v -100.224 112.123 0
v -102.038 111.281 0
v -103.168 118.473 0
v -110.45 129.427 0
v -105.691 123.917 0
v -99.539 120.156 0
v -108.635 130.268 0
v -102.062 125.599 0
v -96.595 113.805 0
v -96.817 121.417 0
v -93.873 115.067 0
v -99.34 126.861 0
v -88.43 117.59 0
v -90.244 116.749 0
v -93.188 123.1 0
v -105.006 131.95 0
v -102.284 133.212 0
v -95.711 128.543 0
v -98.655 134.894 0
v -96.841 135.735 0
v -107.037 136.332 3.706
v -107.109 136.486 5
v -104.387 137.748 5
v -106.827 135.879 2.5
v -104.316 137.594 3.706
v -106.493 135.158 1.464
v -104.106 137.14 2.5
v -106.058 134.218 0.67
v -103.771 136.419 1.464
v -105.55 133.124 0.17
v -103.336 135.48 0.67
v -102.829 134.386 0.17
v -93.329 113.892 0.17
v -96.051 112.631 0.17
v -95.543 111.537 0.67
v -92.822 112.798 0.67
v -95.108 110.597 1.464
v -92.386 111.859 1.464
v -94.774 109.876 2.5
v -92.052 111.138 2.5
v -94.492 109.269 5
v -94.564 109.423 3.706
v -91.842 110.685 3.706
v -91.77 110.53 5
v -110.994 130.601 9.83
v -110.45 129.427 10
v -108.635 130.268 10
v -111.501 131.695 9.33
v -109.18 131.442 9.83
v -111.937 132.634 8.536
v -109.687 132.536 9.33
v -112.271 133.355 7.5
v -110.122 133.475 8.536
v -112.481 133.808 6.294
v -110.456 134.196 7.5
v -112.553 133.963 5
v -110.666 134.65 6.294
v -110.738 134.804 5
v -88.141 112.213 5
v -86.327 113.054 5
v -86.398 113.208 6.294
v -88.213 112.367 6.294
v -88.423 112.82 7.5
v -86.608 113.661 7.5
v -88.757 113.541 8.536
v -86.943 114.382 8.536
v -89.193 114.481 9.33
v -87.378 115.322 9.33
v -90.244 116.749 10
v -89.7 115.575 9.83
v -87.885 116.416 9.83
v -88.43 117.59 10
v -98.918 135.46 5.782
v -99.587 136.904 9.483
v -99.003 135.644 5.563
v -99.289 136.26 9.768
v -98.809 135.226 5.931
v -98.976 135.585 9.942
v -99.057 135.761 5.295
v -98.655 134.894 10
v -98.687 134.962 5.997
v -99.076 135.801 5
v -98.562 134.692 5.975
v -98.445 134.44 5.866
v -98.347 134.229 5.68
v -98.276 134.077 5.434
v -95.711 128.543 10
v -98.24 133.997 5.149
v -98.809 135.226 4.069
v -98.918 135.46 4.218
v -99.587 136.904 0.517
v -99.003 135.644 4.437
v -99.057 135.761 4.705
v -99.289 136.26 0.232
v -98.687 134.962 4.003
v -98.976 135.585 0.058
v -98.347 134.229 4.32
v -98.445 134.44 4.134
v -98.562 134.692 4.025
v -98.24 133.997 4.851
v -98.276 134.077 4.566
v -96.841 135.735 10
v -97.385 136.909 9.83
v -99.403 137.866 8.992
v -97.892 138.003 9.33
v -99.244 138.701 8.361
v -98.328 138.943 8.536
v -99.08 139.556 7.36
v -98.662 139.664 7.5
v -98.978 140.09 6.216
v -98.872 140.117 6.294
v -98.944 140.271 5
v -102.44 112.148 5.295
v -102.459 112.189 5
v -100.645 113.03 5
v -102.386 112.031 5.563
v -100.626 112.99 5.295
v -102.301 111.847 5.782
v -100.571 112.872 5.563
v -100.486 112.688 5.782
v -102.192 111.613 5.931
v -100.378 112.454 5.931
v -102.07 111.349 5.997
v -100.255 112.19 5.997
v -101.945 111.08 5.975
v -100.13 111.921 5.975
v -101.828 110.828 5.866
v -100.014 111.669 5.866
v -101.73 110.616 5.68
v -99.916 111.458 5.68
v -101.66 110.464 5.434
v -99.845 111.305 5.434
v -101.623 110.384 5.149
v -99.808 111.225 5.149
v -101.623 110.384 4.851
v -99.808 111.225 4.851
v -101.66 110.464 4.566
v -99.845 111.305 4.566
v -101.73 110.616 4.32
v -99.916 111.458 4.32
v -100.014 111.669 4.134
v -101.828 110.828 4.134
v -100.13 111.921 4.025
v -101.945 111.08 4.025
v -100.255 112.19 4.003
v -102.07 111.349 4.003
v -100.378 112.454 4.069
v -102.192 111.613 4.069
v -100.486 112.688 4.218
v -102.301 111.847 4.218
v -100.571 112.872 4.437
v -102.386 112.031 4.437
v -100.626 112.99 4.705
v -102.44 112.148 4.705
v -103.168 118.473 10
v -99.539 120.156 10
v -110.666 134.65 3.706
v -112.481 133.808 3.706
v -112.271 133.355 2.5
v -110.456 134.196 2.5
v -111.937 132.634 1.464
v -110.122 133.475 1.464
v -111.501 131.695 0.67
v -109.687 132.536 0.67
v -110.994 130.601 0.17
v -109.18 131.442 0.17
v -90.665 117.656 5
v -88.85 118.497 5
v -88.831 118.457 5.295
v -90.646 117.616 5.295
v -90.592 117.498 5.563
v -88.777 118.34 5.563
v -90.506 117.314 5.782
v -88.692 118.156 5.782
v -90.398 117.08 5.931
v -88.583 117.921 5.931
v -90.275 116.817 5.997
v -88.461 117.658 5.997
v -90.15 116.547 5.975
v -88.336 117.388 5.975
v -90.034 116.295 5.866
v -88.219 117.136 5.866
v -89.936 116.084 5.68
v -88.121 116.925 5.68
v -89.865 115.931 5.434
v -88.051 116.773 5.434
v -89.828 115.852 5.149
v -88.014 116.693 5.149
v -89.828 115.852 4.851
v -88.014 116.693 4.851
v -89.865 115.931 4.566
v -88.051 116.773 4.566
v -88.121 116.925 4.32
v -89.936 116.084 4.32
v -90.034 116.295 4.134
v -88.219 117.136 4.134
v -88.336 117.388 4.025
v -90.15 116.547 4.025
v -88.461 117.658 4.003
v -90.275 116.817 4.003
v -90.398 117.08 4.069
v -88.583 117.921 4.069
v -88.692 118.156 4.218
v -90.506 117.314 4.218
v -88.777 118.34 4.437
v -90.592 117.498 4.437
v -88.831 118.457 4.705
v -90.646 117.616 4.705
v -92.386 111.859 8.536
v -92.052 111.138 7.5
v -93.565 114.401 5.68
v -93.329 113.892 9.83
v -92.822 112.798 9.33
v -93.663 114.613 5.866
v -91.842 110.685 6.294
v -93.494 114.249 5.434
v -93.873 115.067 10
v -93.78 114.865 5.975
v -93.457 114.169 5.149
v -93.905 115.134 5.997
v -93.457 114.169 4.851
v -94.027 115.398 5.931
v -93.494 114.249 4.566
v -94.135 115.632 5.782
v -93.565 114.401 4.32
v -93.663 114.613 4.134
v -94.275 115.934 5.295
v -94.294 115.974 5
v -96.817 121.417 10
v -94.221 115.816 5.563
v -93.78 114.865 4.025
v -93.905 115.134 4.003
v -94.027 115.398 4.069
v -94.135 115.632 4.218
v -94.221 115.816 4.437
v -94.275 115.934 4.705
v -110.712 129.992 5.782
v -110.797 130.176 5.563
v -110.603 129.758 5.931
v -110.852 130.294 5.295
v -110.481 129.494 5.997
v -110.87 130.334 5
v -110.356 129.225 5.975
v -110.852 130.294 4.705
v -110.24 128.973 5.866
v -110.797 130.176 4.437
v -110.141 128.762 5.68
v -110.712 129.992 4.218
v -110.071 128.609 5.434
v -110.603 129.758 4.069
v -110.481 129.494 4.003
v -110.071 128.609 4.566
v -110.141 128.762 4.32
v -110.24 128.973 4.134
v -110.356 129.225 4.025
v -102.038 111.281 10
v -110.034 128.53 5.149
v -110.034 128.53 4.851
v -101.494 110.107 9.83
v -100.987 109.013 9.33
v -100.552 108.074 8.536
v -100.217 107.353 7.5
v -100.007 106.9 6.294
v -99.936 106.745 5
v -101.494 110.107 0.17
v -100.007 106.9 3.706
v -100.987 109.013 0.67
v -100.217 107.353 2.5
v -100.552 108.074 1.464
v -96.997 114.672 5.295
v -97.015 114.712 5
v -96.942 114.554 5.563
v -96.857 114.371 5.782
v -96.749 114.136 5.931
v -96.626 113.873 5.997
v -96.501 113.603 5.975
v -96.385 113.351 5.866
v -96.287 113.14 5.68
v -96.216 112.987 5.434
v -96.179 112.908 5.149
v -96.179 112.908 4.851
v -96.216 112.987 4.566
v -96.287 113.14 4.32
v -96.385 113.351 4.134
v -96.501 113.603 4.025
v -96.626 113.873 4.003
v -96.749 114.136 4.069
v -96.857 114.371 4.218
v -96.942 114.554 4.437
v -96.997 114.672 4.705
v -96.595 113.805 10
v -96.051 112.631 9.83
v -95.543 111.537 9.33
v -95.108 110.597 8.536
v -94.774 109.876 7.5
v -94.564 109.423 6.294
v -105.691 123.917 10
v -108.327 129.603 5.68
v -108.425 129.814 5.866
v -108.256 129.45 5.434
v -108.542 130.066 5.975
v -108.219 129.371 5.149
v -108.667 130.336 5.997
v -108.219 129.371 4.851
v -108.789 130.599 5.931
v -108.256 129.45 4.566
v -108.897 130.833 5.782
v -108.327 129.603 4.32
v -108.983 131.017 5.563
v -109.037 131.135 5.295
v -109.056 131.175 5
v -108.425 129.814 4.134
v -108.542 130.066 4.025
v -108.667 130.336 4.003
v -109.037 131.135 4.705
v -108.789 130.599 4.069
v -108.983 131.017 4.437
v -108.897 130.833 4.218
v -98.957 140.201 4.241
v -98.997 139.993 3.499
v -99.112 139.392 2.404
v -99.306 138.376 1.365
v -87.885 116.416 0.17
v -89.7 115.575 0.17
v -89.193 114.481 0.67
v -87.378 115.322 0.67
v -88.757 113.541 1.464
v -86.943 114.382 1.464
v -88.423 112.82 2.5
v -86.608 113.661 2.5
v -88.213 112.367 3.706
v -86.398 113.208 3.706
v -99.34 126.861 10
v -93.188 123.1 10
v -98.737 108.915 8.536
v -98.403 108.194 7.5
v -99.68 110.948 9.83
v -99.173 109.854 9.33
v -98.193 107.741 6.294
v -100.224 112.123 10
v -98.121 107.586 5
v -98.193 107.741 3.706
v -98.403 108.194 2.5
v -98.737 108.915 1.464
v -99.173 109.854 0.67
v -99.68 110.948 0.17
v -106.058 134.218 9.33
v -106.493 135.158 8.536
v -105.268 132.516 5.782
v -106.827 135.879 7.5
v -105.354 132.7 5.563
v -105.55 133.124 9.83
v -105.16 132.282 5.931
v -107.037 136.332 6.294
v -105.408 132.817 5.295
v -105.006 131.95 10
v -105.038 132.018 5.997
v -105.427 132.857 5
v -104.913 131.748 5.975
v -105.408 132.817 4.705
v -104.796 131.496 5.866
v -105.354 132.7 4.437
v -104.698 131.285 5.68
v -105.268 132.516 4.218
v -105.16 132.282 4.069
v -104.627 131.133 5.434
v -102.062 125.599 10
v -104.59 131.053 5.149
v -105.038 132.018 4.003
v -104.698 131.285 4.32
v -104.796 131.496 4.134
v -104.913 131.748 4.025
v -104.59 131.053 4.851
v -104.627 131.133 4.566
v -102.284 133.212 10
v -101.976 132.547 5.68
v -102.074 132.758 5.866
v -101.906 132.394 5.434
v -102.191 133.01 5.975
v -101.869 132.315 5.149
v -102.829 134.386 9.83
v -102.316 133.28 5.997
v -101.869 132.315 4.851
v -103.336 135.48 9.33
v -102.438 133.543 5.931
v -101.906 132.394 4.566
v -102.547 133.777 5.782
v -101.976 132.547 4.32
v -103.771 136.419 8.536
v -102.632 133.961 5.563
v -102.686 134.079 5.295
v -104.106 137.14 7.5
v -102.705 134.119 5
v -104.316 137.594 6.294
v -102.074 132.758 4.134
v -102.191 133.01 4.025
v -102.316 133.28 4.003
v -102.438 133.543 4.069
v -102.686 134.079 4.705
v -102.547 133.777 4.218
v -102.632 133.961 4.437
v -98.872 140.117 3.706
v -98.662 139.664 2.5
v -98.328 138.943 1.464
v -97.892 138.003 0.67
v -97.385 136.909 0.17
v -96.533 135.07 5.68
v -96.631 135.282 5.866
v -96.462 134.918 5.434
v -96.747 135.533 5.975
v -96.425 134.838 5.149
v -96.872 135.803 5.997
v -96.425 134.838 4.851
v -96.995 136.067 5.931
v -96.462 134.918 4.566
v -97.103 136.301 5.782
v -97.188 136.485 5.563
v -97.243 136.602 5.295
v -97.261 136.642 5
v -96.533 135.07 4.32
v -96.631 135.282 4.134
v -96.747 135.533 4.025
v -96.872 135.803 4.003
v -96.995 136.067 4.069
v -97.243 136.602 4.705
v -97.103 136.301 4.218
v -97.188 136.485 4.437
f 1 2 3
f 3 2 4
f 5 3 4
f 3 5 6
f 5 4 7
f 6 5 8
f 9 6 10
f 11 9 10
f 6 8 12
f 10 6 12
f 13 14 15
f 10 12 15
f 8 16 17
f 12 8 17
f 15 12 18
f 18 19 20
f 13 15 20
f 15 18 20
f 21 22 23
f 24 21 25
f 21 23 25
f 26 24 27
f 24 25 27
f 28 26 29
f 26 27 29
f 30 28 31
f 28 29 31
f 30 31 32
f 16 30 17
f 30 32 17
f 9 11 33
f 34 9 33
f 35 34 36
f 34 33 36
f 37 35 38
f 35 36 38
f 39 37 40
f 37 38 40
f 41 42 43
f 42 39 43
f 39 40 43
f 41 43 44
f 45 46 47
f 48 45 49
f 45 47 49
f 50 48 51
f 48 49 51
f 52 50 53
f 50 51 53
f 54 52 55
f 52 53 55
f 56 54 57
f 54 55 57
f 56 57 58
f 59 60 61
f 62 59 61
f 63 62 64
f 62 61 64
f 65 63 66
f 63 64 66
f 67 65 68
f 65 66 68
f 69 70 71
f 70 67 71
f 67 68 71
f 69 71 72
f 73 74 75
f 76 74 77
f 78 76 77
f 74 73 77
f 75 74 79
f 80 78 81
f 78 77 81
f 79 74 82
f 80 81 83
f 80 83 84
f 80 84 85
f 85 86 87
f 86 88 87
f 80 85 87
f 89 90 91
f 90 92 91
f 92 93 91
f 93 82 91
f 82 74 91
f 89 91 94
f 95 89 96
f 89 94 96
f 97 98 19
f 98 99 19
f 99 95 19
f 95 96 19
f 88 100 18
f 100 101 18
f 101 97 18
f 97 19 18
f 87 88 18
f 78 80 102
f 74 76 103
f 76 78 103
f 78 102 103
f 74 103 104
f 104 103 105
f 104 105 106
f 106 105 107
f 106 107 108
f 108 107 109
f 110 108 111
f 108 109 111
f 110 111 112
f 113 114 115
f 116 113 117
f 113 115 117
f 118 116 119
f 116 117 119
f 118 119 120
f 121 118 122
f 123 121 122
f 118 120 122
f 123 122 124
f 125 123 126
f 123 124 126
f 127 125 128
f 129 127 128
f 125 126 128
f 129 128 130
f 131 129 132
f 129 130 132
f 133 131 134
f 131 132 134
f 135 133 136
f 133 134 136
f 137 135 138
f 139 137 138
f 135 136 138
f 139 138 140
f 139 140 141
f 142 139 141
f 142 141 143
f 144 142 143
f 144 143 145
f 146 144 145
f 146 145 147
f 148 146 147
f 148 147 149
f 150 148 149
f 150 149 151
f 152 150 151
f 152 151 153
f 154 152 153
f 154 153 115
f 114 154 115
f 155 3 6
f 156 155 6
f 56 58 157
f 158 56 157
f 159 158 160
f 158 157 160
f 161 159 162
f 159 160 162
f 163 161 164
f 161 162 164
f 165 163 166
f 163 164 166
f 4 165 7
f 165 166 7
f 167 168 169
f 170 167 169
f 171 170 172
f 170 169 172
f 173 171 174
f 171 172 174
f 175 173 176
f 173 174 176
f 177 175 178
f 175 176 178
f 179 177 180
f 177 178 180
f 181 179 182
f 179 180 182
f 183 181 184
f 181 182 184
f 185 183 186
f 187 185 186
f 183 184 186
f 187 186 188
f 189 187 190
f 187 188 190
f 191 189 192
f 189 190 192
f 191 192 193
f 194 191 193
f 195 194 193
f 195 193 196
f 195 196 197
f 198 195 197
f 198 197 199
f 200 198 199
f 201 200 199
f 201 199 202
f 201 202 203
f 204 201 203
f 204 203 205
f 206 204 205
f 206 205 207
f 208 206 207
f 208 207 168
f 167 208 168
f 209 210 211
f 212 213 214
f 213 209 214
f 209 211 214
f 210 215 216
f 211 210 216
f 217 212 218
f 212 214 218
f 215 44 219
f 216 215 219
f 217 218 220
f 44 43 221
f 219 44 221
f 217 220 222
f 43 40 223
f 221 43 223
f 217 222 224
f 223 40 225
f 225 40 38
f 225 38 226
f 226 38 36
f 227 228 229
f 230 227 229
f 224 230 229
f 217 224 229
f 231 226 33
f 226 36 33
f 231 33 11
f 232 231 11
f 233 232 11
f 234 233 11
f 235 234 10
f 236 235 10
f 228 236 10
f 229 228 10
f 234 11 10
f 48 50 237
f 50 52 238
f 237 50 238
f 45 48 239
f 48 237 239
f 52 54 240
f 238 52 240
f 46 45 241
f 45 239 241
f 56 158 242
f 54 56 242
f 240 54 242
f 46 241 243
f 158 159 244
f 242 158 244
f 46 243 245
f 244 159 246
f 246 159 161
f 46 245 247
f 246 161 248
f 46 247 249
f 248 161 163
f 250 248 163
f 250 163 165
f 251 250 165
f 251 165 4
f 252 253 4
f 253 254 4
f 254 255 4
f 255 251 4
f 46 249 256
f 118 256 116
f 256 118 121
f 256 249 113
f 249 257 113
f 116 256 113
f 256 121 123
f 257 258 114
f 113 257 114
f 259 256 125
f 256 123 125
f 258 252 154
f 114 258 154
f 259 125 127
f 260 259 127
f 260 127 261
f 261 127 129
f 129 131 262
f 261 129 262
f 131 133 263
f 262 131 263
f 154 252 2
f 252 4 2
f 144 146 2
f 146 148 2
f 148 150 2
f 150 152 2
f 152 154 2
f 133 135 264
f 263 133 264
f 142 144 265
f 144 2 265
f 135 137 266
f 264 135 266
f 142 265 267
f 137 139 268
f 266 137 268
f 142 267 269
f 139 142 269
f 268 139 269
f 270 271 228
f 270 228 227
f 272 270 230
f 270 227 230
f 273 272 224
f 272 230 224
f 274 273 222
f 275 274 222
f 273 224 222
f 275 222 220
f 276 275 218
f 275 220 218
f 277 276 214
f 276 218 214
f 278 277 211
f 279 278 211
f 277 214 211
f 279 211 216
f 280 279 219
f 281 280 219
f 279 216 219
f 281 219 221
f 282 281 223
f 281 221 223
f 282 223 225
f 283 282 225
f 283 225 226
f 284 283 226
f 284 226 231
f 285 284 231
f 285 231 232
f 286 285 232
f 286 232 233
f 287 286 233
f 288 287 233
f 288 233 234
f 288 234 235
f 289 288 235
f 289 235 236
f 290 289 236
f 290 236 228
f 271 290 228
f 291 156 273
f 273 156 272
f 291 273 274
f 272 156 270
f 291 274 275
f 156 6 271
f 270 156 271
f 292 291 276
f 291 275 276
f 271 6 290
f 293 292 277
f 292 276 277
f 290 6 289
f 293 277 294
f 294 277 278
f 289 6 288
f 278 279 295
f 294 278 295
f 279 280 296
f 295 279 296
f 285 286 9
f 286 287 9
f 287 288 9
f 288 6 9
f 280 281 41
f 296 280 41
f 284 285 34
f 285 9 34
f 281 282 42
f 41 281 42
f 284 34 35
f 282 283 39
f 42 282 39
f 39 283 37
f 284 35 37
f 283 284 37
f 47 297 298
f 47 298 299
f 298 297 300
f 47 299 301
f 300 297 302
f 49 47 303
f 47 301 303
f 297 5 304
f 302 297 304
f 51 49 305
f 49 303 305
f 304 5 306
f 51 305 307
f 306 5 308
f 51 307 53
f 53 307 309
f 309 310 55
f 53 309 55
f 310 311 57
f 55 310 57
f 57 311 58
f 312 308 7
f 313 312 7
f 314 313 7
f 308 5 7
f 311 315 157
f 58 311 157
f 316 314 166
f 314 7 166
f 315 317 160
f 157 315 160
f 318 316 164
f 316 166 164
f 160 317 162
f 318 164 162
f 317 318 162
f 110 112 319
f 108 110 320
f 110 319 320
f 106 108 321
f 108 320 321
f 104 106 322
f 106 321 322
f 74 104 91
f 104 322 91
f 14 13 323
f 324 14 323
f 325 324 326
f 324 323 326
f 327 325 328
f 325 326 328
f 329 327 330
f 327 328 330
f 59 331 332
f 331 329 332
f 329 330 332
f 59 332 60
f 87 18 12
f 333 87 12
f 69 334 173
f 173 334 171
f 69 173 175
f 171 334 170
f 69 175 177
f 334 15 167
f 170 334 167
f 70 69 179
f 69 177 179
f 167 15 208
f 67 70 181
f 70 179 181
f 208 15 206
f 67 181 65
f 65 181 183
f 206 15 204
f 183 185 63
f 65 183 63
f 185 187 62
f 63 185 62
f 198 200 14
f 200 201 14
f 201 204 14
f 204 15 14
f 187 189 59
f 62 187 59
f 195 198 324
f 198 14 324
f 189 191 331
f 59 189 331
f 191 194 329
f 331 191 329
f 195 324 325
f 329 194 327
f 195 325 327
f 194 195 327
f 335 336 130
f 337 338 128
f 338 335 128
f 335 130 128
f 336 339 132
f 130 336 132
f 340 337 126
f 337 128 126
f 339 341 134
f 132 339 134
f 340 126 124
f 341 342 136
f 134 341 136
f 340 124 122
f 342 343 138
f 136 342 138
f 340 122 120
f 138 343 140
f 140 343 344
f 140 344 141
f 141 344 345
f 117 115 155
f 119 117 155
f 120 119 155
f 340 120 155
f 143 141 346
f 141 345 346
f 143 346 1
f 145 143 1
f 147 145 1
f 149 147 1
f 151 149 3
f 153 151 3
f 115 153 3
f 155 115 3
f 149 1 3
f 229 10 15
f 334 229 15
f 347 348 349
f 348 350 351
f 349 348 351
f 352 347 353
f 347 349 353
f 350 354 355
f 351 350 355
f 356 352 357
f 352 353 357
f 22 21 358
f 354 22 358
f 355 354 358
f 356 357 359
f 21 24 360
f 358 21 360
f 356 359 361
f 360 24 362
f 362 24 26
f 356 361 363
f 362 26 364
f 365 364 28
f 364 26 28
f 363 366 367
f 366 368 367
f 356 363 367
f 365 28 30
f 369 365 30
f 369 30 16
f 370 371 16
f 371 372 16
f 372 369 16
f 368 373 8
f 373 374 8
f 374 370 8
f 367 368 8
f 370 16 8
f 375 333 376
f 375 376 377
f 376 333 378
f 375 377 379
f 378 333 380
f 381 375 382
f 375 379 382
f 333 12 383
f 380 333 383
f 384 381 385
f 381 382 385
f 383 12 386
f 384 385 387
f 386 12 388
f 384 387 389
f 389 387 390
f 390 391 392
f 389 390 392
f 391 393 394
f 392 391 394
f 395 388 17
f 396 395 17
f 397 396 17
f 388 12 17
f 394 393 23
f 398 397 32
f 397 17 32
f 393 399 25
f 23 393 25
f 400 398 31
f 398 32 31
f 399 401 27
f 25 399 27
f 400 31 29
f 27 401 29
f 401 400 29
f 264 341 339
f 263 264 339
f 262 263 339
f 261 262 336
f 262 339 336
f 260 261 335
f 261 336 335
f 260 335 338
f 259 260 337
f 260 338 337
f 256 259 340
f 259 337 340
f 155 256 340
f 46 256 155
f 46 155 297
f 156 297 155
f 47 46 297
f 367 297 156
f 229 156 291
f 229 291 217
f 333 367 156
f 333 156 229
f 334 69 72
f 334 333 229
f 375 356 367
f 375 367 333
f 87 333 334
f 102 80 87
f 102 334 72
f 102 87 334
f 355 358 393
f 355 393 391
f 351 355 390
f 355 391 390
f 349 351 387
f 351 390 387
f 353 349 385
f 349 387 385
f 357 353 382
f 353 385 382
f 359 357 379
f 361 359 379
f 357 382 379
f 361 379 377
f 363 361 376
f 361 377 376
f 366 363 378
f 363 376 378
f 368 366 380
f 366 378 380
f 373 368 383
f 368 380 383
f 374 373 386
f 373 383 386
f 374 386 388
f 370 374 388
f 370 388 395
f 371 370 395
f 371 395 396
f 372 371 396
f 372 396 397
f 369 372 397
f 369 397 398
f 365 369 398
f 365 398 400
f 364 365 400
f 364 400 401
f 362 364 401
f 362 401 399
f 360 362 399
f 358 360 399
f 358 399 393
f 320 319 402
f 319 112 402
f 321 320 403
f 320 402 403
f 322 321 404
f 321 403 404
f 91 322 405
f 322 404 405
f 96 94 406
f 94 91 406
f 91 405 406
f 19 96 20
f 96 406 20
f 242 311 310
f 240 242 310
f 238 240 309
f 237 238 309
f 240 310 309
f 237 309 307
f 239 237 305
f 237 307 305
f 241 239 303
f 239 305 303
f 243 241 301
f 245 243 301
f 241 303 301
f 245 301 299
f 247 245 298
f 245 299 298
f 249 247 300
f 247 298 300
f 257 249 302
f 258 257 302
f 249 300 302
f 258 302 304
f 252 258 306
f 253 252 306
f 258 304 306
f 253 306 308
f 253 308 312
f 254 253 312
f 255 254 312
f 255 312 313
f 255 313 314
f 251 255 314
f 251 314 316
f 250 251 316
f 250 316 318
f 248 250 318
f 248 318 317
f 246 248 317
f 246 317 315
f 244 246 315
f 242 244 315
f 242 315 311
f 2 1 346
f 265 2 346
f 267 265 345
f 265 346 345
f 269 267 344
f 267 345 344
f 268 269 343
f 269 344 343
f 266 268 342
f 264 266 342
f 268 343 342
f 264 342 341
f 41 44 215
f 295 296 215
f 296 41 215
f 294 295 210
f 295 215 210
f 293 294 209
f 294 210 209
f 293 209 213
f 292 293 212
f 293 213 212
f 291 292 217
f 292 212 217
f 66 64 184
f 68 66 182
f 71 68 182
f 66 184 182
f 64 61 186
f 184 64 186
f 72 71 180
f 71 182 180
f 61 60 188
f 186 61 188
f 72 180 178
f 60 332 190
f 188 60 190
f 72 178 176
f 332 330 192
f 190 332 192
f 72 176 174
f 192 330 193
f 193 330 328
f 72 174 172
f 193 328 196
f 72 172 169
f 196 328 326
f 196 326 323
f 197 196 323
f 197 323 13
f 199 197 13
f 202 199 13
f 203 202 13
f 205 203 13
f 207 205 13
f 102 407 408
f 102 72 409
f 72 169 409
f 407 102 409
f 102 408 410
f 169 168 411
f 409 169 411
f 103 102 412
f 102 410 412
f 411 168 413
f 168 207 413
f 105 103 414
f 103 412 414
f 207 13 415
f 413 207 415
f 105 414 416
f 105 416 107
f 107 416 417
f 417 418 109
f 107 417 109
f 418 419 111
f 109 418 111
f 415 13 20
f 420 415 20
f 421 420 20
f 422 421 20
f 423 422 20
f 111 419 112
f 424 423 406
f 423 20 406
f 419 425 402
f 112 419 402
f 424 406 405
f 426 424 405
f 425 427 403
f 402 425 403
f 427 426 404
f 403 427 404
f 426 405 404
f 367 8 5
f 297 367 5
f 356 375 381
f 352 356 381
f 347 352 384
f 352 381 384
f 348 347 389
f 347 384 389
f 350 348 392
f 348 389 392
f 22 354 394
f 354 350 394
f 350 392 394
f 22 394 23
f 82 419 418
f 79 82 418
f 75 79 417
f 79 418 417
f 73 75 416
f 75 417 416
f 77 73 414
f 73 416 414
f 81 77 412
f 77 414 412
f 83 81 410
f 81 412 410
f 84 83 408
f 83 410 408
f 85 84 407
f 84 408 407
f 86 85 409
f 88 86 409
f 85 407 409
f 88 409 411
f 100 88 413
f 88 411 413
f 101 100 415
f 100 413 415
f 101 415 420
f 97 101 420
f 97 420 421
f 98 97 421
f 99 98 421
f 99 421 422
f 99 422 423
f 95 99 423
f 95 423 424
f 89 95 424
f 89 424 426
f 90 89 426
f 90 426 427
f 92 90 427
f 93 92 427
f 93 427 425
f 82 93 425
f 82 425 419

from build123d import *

# Parameters (mm, degrees)
BOSS_EXTRU_1_DEPTH      = 10
ESQUISSE2_R             = 1
ENL_V_MAT_EXTRU_1_DEPTH = 15


with BuildPart() as part:
    # Esquisse1 → Boss.-Extru.1 (new body)
    with BuildSketch(Plane.XY):
        Polygon((-110.738106784, 134.804121916), (-112.552630047, 133.962988556), (-99.935629642, 106.745139618), (-98.12110638, 107.586272978), (-103.167906542, 118.473412553), (-99.538860017, 120.155679274), (-94.492059855, 109.268539699), (-91.770274961, 110.530239739), (-96.817075123, 121.417379314), (-93.188028598, 123.099646035), (-88.141228436, 112.21250646), (-86.326705174, 113.05363982), (-98.943705578, 140.271488758), (-99.586991765, 136.903720479), (-95.711428679, 128.543215823), (-99.340475204, 126.860949102), (-104.387275366, 137.748088677), (-107.109060259, 136.486388637), (-102.062260098, 125.599249062), (-105.691306623, 123.916982341), align=None)
    extrude(amount=BOSS_EXTRU_1_DEPTH)

    # Esquisse2 → Enlèv. mat.-Extru.1 (cut)
    with BuildSketch(Plane(origin=(-27.920353757, -12.942650812, 0), x_dir=(0, 0, -1), z_dir=(0.9072616312569988, 0.42056668014583565, 0))):
        with Locations(Location((-5, 163.875365486, 0), (0, 0, 90))):
            Circle(ESQUISSE2_R)
        with Locations(Location((-5, 143.875365486, 0), (0, 0, 90))):
            Circle(ESQUISSE2_R)
        with BuildLine():
            Line((0, 138.875365486), (0, 143.875365486))
            ThreePointArc((0, 143.875365486), (-1.464466094, 140.33983158), (-5, 138.875365486))
            Line((-5, 138.875365486), (0, 138.875365486))
        make_face()
        with BuildLine():
            ThreePointArc((-5, 138.875365486), (-8.535533906, 140.33983158), (-10, 143.875365486))
            Line((-10, 143.875365486), (-10, 138.875365486))
            Line((-10, 138.875365486), (-5, 138.875365486))
        make_face()
        with BuildLine():
            Line((-10, 168.875365486), (-10, 163.875365486))
            ThreePointArc((-10, 163.875365486), (-8.535533906, 167.410899392), (-5, 168.875365486))
            Line((-5, 168.875365486), (-10, 168.875365486))
        make_face()
        with BuildLine():
            Line((0, 168.875365486), (-5, 168.875365486))
            ThreePointArc((-5, 168.875365486), (-1.464466094, 167.410899392), (0, 163.875365486))
            Line((0, 163.875365486), (0, 168.875365486))
        make_face()
    extrude(amount=-ENL_V_MAT_EXTRU_1_DEPTH, mode=Mode.SUBTRACT)


solid = part.part
